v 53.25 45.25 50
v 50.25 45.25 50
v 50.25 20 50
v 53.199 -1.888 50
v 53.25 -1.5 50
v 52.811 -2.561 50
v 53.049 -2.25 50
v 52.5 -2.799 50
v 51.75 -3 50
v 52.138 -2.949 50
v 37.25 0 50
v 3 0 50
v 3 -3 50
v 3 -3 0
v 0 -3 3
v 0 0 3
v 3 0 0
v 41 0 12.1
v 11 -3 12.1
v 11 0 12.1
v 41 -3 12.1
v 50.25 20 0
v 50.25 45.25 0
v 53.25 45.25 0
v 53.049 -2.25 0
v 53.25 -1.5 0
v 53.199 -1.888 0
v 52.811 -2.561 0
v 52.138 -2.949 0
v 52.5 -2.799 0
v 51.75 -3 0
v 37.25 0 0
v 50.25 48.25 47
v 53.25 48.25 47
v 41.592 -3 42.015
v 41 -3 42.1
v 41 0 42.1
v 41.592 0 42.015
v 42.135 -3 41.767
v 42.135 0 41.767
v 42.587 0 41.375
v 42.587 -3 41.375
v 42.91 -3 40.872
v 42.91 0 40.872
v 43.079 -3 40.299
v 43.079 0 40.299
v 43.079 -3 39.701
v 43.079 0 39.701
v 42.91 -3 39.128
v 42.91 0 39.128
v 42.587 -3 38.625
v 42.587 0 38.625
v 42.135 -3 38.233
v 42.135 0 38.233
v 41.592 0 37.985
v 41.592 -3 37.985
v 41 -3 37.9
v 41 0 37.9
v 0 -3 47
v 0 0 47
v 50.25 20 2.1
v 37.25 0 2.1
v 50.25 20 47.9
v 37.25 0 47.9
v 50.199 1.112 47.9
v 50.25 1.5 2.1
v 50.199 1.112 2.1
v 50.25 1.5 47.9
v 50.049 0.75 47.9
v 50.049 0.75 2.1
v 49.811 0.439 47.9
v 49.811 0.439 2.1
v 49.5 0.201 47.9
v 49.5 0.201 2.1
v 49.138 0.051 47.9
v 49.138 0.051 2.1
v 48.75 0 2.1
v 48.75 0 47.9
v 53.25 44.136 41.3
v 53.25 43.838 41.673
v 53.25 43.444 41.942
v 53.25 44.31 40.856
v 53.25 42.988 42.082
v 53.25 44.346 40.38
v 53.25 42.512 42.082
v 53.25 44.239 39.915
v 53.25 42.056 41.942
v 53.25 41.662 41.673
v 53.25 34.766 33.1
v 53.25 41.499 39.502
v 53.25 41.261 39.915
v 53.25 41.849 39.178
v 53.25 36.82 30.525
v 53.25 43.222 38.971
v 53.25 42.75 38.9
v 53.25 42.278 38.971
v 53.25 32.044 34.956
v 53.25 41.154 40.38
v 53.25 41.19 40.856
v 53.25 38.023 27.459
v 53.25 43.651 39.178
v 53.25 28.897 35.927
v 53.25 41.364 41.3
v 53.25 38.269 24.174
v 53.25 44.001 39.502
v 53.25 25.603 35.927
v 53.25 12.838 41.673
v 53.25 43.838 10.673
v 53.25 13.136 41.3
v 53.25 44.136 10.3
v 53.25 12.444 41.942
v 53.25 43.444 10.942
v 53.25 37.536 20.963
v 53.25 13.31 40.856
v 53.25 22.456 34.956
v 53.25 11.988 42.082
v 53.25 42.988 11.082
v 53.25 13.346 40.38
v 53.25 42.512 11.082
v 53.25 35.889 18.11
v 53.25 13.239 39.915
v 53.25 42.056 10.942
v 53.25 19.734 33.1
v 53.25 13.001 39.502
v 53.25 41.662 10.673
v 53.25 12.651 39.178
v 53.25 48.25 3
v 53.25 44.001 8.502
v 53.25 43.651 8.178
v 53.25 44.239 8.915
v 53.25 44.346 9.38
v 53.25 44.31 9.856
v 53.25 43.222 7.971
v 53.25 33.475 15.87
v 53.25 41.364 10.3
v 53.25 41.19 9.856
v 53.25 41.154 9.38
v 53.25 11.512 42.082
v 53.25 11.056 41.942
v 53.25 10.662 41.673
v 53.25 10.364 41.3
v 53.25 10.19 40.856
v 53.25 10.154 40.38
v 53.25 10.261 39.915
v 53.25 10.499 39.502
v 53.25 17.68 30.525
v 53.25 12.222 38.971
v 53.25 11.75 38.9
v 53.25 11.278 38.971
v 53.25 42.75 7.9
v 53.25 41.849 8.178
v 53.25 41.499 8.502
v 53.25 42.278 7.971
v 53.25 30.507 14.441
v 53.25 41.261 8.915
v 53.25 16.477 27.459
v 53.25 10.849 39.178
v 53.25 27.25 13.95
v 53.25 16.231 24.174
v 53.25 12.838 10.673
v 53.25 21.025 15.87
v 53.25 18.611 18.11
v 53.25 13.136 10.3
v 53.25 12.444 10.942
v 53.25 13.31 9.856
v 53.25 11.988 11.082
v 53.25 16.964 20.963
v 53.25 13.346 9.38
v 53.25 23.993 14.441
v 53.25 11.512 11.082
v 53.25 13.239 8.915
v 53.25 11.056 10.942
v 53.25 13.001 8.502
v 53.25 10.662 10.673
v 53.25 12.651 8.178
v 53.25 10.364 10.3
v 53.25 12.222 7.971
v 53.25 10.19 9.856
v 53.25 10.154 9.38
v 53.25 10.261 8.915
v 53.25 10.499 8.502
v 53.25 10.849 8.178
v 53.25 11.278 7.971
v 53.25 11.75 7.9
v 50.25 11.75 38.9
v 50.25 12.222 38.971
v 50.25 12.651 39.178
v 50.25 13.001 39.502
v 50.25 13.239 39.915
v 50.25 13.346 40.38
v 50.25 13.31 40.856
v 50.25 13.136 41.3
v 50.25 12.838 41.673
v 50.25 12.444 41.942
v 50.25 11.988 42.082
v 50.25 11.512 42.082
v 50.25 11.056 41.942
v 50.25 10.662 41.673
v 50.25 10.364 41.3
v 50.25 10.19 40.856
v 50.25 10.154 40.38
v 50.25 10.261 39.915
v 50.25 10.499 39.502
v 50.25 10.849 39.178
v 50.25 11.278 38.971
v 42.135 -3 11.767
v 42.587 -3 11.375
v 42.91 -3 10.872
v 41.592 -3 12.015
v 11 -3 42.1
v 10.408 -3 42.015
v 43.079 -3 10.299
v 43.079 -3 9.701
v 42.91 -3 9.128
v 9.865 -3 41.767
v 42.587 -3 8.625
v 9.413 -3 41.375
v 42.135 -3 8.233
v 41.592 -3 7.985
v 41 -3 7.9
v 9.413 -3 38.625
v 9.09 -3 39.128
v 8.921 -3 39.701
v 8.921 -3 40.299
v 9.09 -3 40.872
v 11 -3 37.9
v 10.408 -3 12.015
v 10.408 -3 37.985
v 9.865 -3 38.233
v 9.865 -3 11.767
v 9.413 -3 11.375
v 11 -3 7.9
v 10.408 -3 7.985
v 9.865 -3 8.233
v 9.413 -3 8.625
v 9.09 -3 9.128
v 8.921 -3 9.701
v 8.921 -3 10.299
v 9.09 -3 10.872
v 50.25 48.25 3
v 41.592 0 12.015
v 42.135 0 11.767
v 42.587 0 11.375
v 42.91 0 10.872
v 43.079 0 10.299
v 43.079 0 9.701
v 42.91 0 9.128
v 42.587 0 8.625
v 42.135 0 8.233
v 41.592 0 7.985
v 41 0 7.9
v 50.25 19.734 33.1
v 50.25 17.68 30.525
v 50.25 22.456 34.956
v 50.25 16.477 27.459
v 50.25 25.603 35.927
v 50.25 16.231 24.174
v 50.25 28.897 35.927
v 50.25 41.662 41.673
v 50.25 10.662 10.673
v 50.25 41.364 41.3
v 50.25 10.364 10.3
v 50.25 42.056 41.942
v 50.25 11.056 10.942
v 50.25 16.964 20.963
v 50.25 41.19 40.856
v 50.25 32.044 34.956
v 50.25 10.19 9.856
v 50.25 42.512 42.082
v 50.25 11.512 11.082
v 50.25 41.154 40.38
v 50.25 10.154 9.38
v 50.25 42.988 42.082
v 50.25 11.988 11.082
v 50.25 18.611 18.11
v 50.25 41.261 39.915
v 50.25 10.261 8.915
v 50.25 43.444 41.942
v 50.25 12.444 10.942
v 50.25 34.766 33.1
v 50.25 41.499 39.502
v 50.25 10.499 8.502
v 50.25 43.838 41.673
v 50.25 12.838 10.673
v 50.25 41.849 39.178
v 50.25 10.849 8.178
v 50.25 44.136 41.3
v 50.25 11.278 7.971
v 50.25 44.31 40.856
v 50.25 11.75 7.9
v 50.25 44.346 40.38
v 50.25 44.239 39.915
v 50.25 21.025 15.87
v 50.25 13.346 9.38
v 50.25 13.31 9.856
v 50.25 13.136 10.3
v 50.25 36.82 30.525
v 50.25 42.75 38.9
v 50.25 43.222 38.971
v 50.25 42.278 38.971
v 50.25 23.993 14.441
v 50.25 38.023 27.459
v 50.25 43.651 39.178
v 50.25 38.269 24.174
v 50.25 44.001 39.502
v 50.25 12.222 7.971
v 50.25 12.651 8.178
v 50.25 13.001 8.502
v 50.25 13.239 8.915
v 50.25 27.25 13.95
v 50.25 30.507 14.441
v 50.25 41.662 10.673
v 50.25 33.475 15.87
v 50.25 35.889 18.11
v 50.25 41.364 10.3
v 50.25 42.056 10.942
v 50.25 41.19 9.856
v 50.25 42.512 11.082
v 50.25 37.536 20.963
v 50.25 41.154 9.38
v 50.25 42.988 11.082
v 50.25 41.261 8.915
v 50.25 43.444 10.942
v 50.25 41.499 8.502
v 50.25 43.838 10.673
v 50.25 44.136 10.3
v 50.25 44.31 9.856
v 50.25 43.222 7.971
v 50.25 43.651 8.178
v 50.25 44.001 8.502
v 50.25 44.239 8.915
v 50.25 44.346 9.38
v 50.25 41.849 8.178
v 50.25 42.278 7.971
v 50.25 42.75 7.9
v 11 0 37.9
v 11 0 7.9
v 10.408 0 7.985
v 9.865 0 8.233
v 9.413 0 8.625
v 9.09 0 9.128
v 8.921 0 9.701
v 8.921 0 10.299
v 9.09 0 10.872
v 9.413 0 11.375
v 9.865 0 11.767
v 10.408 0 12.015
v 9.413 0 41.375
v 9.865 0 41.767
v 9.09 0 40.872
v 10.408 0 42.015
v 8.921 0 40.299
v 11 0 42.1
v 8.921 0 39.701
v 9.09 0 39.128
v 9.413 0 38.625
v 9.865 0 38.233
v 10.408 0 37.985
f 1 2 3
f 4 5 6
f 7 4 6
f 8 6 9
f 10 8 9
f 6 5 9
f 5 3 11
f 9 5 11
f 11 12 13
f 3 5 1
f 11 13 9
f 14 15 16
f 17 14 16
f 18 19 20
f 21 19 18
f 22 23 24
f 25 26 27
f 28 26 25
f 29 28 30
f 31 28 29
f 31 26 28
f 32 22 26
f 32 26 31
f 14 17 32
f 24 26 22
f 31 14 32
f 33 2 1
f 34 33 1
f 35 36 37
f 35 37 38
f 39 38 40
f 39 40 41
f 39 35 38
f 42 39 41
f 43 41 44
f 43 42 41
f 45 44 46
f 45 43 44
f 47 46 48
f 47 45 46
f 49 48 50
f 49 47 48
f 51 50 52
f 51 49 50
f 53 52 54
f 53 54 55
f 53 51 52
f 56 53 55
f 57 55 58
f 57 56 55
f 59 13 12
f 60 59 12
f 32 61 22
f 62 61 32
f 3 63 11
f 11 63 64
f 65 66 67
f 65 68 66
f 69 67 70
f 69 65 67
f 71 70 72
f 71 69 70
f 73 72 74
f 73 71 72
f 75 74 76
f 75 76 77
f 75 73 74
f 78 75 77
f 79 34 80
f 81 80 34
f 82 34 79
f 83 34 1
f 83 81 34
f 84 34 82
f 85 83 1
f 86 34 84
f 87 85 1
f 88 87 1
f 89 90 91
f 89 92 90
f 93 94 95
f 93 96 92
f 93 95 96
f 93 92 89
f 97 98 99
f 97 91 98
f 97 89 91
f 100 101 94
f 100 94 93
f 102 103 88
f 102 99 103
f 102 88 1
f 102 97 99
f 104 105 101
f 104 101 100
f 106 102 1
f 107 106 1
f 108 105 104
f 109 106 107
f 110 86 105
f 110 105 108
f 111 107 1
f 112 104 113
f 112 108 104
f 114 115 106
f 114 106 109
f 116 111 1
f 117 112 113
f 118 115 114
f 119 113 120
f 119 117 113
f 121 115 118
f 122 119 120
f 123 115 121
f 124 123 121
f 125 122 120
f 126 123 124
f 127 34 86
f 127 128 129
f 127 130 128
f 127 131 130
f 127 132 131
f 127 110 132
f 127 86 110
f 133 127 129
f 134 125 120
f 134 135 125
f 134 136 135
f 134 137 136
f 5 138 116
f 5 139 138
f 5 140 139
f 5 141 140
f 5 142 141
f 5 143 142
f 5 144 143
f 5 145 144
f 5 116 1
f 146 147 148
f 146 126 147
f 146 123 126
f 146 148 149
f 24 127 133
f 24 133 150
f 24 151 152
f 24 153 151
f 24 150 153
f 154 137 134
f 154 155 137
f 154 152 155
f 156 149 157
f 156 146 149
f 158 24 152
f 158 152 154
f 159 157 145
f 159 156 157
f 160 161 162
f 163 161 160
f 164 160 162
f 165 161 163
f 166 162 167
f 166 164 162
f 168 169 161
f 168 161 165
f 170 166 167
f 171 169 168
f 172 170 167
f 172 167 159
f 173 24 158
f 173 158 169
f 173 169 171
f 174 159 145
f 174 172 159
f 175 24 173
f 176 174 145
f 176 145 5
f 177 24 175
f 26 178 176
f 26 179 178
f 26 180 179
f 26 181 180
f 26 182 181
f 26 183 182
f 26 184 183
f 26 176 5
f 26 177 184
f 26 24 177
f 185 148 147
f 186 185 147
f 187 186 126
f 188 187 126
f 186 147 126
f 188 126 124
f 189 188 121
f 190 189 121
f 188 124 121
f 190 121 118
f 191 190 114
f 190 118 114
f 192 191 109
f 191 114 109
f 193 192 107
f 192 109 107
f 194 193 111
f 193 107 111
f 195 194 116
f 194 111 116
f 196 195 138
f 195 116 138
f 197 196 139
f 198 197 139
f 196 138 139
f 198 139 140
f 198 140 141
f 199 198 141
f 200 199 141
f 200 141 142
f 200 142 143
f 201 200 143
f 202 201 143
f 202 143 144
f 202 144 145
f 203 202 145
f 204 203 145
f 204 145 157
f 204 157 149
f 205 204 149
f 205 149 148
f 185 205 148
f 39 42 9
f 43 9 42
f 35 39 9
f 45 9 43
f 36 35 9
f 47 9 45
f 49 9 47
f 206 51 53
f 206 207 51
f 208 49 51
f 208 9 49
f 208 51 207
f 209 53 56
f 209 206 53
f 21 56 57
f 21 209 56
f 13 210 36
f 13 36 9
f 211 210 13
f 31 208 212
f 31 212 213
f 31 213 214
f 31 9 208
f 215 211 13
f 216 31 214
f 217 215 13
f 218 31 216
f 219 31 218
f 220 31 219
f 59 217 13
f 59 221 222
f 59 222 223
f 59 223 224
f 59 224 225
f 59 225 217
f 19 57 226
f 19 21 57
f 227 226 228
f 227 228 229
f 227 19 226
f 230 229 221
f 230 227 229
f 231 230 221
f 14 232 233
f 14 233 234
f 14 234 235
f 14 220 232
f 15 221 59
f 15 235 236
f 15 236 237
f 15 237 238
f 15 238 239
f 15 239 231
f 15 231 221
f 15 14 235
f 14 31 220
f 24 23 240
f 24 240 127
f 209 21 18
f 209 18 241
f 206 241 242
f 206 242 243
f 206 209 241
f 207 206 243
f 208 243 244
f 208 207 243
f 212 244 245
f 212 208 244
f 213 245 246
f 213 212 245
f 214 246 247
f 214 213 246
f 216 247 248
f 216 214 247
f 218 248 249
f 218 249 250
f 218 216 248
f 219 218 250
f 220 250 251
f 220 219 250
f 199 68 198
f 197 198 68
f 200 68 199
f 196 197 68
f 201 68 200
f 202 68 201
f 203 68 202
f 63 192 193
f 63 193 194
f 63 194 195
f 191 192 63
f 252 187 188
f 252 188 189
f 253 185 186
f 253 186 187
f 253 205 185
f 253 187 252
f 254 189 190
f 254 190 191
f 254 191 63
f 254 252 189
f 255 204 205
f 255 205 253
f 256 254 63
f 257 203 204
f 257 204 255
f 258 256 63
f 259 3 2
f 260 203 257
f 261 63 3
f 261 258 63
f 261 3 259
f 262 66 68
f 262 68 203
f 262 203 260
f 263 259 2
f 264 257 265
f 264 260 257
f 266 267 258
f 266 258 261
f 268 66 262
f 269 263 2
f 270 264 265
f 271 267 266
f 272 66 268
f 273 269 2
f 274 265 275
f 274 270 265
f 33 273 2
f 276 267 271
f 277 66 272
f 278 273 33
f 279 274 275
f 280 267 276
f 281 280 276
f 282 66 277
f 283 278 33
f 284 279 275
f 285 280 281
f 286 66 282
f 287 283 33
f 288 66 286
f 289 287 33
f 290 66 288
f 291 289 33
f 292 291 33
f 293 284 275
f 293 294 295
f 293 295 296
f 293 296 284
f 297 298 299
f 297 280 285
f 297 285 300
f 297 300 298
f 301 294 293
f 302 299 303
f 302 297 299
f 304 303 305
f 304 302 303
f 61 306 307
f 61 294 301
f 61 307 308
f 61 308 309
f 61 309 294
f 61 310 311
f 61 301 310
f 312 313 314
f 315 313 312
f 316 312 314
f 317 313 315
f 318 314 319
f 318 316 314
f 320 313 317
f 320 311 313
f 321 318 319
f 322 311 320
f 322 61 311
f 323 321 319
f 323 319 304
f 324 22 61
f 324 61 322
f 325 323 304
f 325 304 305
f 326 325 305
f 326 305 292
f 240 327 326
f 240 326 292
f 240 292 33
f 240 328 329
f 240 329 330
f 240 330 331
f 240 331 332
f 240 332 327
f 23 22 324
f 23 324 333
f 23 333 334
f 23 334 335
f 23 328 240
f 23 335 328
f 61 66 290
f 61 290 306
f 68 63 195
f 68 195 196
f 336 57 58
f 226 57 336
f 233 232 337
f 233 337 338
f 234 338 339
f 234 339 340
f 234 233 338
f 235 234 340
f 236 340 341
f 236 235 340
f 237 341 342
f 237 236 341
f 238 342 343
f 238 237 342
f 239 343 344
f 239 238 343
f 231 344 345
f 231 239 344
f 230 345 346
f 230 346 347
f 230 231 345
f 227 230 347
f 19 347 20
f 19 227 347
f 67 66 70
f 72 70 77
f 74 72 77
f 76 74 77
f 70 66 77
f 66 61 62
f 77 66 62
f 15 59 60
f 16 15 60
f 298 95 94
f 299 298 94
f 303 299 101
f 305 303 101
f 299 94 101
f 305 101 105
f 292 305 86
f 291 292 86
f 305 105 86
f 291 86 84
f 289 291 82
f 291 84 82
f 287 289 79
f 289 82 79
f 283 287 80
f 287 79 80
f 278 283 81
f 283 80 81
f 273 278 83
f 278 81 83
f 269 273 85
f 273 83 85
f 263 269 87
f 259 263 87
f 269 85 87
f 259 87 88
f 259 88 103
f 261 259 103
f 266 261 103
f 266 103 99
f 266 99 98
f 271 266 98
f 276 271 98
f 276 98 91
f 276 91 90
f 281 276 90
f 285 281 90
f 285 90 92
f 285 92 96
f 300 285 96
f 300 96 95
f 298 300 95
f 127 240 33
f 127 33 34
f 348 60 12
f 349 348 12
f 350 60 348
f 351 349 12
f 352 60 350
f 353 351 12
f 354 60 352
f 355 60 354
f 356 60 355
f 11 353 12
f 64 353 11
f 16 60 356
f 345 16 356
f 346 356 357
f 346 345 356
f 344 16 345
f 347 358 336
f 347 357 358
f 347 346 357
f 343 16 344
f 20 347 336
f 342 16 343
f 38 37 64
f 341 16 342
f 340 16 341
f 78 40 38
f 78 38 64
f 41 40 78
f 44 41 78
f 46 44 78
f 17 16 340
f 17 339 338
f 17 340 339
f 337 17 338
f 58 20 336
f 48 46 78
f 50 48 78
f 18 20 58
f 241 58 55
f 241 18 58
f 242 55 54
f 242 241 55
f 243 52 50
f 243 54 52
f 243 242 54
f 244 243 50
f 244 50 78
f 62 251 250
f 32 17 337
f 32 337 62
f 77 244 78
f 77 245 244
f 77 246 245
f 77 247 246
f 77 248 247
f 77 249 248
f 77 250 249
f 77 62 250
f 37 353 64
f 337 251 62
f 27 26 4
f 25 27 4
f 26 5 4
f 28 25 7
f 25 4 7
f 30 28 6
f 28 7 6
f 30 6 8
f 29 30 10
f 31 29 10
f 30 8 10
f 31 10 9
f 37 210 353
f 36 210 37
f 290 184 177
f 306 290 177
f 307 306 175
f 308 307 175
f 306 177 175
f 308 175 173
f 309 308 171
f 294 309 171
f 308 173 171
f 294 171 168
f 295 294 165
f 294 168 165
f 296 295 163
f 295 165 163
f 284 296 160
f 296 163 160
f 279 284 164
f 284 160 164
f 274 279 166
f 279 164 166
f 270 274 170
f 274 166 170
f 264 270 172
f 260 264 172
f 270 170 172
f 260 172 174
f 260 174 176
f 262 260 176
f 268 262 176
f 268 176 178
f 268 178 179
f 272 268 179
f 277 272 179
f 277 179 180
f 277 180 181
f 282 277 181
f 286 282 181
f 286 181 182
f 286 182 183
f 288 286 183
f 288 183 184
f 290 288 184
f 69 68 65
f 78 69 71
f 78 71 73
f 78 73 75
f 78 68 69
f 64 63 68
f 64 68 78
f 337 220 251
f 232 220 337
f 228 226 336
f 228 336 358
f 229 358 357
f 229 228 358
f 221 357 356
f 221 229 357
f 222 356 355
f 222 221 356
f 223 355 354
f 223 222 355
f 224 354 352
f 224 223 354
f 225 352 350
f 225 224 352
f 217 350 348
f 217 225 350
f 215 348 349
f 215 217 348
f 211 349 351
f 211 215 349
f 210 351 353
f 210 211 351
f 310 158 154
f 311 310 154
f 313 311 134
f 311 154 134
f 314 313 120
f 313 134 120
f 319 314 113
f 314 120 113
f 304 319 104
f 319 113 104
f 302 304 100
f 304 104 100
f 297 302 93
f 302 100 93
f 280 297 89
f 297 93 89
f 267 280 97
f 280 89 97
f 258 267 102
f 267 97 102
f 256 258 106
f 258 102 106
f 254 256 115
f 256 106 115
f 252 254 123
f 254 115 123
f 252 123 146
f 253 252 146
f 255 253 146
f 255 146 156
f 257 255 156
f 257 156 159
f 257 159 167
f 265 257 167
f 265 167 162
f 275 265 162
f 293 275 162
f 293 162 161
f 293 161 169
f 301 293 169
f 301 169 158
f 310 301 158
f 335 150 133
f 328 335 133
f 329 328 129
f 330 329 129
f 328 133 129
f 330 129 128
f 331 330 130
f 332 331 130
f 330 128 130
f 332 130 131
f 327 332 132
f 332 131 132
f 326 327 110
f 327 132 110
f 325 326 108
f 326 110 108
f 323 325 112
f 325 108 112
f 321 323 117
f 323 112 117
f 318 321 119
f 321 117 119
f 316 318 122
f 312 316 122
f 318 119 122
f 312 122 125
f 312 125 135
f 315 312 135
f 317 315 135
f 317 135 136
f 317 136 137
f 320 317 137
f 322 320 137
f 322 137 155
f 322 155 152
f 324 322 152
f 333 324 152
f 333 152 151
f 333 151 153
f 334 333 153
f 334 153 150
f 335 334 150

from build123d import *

# Parameters (mm, degrees)
EXTRUDE_1_DEPTH             = 50
HOLE_WIZARD_1_D             = 22.1
HOLE_WIZARD_1_DEPTH         = 100
HOLE_WIZARD_2_D             = 3.2
HOLE_WIZARD_2_DEPTH         = 100
HOLE_START                  = -3
HOLE_WIZARD_4_2_4_2_1_DEPTH = 3
RIB_1_REACH                 = 89.542
SKETCH_13_WALL_W            = 200.93798631
SKETCH_13_WALL_H            = 2.1
CHAMFER_1_SIZE              = 3
FILLET_1_R                  = 1.5
FILLET_2_R                  = 1.5


# Read off the part's stored shape, not the designer's step: Ø4.2 (4.2) 直径槽口1
with BuildPart() as part:
    # 草图1 → 凸台-拉伸1 (new body)
    with BuildSketch(Plane.XY):
        Polygon((0, 0), (50.25, 0), (50.25, 48.25), (53.25, 48.25), (53.25, -3), (0, -3), align=None)
    extrude(amount=EXTRUDE_1_DEPTH)

    # 孔1
    with Locations(Plane.ZY.offset(-50.25)):
        with Locations((25, 27.25)):
            Hole(HOLE_WIZARD_1_D / 2, depth=HOLE_WIZARD_1_DEPTH)

    # 孔2
    with Locations(Plane.ZY.offset(-50.25)):
        with Locations((9.5, 42.75), (40.5, 42.75), (40.5, 11.75), (9.5, 11.75)):
            Hole(HOLE_WIZARD_2_D / 2, depth=HOLE_WIZARD_2_DEPTH)

    # Ø4.2 (4.2) 直径槽口1 outline → Ø4.2 (4.2) 直径槽口1 (cut)
    with BuildSketch(Plane(origin=(0, 0, 0), x_dir=(1, 0, 0), z_dir=(0, 1, 0)).offset(HOLE_START)):
        with BuildLine():
            Line((11, -42.1), (41, -42.1))
            ThreePointArc((41, -42.1), (43.1, -40), (41, -37.9))
            Line((41, -37.9), (11, -37.9))
            ThreePointArc((11, -37.9), (8.9, -40), (11, -42.1))
        make_face()
        with BuildLine():
            Line((11, -12.1), (41, -12.1))
            ThreePointArc((41, -12.1), (43.1, -10), (41, -7.9))
            Line((41, -7.9), (11, -7.9))
            ThreePointArc((11, -7.9), (8.9, -10), (11, -12.1))
        make_face()
    extrude(amount=HOLE_WIZARD_4_2_4_2_1_DEPTH, mode=Mode.SUBTRACT)

    # 草图13 wall → 筋1 (add, up to next)
    with BuildSketch(Plane(origin=(43.75, 10, 50), x_dir=(-0.544988350595, -0.838443616301, 0), z_dir=(0.838443616301, -0.544988350595, 0)), mode=Mode.PRIVATE) as rib_1_sk1:
        with Locations((0, 1.05)):
            Rectangle(SKETCH_13_WALL_W, SKETCH_13_WALL_H)
    rib_1_tool1 = extrude(rib_1_sk1.sketch, amount=RIB_1_REACH, mode=Mode.PRIVATE) - part.part
    rib_1 = rib_1_tool1.solids().sort_by_distance((43.75, 10, 50))[0]
    add(rib_1)

    # 镜向1: 筋1 across plane
    add(rib_1.mirror(Plane.XY.offset(25)))

    # 倒角1
    chamfer_1_edges = [part.edges().sort_by_distance(p)[0] for p in [
        (51.75, 48.25, 50),
        (0, -1.5, 50),
        (51.75, 48.25, 0),
        (0, -1.5, 0),
    ]]
    chamfer(chamfer_1_edges, length=CHAMFER_1_SIZE)

    # 圆角1
    fillet_1_edges = [part.edges().sort_by_distance(p)[0] for p in [
        (53.25, -3, 25),
    ]]
    fillet(fillet_1_edges, radius=FILLET_1_R)

    # 圆角2
    fillet_2_edges = [part.edges().sort_by_distance(p)[0] for p in [
        (50.25, 0, 25),
    ]]
    fillet(fillet_2_edges, radius=FILLET_2_R)


solid = part.part
